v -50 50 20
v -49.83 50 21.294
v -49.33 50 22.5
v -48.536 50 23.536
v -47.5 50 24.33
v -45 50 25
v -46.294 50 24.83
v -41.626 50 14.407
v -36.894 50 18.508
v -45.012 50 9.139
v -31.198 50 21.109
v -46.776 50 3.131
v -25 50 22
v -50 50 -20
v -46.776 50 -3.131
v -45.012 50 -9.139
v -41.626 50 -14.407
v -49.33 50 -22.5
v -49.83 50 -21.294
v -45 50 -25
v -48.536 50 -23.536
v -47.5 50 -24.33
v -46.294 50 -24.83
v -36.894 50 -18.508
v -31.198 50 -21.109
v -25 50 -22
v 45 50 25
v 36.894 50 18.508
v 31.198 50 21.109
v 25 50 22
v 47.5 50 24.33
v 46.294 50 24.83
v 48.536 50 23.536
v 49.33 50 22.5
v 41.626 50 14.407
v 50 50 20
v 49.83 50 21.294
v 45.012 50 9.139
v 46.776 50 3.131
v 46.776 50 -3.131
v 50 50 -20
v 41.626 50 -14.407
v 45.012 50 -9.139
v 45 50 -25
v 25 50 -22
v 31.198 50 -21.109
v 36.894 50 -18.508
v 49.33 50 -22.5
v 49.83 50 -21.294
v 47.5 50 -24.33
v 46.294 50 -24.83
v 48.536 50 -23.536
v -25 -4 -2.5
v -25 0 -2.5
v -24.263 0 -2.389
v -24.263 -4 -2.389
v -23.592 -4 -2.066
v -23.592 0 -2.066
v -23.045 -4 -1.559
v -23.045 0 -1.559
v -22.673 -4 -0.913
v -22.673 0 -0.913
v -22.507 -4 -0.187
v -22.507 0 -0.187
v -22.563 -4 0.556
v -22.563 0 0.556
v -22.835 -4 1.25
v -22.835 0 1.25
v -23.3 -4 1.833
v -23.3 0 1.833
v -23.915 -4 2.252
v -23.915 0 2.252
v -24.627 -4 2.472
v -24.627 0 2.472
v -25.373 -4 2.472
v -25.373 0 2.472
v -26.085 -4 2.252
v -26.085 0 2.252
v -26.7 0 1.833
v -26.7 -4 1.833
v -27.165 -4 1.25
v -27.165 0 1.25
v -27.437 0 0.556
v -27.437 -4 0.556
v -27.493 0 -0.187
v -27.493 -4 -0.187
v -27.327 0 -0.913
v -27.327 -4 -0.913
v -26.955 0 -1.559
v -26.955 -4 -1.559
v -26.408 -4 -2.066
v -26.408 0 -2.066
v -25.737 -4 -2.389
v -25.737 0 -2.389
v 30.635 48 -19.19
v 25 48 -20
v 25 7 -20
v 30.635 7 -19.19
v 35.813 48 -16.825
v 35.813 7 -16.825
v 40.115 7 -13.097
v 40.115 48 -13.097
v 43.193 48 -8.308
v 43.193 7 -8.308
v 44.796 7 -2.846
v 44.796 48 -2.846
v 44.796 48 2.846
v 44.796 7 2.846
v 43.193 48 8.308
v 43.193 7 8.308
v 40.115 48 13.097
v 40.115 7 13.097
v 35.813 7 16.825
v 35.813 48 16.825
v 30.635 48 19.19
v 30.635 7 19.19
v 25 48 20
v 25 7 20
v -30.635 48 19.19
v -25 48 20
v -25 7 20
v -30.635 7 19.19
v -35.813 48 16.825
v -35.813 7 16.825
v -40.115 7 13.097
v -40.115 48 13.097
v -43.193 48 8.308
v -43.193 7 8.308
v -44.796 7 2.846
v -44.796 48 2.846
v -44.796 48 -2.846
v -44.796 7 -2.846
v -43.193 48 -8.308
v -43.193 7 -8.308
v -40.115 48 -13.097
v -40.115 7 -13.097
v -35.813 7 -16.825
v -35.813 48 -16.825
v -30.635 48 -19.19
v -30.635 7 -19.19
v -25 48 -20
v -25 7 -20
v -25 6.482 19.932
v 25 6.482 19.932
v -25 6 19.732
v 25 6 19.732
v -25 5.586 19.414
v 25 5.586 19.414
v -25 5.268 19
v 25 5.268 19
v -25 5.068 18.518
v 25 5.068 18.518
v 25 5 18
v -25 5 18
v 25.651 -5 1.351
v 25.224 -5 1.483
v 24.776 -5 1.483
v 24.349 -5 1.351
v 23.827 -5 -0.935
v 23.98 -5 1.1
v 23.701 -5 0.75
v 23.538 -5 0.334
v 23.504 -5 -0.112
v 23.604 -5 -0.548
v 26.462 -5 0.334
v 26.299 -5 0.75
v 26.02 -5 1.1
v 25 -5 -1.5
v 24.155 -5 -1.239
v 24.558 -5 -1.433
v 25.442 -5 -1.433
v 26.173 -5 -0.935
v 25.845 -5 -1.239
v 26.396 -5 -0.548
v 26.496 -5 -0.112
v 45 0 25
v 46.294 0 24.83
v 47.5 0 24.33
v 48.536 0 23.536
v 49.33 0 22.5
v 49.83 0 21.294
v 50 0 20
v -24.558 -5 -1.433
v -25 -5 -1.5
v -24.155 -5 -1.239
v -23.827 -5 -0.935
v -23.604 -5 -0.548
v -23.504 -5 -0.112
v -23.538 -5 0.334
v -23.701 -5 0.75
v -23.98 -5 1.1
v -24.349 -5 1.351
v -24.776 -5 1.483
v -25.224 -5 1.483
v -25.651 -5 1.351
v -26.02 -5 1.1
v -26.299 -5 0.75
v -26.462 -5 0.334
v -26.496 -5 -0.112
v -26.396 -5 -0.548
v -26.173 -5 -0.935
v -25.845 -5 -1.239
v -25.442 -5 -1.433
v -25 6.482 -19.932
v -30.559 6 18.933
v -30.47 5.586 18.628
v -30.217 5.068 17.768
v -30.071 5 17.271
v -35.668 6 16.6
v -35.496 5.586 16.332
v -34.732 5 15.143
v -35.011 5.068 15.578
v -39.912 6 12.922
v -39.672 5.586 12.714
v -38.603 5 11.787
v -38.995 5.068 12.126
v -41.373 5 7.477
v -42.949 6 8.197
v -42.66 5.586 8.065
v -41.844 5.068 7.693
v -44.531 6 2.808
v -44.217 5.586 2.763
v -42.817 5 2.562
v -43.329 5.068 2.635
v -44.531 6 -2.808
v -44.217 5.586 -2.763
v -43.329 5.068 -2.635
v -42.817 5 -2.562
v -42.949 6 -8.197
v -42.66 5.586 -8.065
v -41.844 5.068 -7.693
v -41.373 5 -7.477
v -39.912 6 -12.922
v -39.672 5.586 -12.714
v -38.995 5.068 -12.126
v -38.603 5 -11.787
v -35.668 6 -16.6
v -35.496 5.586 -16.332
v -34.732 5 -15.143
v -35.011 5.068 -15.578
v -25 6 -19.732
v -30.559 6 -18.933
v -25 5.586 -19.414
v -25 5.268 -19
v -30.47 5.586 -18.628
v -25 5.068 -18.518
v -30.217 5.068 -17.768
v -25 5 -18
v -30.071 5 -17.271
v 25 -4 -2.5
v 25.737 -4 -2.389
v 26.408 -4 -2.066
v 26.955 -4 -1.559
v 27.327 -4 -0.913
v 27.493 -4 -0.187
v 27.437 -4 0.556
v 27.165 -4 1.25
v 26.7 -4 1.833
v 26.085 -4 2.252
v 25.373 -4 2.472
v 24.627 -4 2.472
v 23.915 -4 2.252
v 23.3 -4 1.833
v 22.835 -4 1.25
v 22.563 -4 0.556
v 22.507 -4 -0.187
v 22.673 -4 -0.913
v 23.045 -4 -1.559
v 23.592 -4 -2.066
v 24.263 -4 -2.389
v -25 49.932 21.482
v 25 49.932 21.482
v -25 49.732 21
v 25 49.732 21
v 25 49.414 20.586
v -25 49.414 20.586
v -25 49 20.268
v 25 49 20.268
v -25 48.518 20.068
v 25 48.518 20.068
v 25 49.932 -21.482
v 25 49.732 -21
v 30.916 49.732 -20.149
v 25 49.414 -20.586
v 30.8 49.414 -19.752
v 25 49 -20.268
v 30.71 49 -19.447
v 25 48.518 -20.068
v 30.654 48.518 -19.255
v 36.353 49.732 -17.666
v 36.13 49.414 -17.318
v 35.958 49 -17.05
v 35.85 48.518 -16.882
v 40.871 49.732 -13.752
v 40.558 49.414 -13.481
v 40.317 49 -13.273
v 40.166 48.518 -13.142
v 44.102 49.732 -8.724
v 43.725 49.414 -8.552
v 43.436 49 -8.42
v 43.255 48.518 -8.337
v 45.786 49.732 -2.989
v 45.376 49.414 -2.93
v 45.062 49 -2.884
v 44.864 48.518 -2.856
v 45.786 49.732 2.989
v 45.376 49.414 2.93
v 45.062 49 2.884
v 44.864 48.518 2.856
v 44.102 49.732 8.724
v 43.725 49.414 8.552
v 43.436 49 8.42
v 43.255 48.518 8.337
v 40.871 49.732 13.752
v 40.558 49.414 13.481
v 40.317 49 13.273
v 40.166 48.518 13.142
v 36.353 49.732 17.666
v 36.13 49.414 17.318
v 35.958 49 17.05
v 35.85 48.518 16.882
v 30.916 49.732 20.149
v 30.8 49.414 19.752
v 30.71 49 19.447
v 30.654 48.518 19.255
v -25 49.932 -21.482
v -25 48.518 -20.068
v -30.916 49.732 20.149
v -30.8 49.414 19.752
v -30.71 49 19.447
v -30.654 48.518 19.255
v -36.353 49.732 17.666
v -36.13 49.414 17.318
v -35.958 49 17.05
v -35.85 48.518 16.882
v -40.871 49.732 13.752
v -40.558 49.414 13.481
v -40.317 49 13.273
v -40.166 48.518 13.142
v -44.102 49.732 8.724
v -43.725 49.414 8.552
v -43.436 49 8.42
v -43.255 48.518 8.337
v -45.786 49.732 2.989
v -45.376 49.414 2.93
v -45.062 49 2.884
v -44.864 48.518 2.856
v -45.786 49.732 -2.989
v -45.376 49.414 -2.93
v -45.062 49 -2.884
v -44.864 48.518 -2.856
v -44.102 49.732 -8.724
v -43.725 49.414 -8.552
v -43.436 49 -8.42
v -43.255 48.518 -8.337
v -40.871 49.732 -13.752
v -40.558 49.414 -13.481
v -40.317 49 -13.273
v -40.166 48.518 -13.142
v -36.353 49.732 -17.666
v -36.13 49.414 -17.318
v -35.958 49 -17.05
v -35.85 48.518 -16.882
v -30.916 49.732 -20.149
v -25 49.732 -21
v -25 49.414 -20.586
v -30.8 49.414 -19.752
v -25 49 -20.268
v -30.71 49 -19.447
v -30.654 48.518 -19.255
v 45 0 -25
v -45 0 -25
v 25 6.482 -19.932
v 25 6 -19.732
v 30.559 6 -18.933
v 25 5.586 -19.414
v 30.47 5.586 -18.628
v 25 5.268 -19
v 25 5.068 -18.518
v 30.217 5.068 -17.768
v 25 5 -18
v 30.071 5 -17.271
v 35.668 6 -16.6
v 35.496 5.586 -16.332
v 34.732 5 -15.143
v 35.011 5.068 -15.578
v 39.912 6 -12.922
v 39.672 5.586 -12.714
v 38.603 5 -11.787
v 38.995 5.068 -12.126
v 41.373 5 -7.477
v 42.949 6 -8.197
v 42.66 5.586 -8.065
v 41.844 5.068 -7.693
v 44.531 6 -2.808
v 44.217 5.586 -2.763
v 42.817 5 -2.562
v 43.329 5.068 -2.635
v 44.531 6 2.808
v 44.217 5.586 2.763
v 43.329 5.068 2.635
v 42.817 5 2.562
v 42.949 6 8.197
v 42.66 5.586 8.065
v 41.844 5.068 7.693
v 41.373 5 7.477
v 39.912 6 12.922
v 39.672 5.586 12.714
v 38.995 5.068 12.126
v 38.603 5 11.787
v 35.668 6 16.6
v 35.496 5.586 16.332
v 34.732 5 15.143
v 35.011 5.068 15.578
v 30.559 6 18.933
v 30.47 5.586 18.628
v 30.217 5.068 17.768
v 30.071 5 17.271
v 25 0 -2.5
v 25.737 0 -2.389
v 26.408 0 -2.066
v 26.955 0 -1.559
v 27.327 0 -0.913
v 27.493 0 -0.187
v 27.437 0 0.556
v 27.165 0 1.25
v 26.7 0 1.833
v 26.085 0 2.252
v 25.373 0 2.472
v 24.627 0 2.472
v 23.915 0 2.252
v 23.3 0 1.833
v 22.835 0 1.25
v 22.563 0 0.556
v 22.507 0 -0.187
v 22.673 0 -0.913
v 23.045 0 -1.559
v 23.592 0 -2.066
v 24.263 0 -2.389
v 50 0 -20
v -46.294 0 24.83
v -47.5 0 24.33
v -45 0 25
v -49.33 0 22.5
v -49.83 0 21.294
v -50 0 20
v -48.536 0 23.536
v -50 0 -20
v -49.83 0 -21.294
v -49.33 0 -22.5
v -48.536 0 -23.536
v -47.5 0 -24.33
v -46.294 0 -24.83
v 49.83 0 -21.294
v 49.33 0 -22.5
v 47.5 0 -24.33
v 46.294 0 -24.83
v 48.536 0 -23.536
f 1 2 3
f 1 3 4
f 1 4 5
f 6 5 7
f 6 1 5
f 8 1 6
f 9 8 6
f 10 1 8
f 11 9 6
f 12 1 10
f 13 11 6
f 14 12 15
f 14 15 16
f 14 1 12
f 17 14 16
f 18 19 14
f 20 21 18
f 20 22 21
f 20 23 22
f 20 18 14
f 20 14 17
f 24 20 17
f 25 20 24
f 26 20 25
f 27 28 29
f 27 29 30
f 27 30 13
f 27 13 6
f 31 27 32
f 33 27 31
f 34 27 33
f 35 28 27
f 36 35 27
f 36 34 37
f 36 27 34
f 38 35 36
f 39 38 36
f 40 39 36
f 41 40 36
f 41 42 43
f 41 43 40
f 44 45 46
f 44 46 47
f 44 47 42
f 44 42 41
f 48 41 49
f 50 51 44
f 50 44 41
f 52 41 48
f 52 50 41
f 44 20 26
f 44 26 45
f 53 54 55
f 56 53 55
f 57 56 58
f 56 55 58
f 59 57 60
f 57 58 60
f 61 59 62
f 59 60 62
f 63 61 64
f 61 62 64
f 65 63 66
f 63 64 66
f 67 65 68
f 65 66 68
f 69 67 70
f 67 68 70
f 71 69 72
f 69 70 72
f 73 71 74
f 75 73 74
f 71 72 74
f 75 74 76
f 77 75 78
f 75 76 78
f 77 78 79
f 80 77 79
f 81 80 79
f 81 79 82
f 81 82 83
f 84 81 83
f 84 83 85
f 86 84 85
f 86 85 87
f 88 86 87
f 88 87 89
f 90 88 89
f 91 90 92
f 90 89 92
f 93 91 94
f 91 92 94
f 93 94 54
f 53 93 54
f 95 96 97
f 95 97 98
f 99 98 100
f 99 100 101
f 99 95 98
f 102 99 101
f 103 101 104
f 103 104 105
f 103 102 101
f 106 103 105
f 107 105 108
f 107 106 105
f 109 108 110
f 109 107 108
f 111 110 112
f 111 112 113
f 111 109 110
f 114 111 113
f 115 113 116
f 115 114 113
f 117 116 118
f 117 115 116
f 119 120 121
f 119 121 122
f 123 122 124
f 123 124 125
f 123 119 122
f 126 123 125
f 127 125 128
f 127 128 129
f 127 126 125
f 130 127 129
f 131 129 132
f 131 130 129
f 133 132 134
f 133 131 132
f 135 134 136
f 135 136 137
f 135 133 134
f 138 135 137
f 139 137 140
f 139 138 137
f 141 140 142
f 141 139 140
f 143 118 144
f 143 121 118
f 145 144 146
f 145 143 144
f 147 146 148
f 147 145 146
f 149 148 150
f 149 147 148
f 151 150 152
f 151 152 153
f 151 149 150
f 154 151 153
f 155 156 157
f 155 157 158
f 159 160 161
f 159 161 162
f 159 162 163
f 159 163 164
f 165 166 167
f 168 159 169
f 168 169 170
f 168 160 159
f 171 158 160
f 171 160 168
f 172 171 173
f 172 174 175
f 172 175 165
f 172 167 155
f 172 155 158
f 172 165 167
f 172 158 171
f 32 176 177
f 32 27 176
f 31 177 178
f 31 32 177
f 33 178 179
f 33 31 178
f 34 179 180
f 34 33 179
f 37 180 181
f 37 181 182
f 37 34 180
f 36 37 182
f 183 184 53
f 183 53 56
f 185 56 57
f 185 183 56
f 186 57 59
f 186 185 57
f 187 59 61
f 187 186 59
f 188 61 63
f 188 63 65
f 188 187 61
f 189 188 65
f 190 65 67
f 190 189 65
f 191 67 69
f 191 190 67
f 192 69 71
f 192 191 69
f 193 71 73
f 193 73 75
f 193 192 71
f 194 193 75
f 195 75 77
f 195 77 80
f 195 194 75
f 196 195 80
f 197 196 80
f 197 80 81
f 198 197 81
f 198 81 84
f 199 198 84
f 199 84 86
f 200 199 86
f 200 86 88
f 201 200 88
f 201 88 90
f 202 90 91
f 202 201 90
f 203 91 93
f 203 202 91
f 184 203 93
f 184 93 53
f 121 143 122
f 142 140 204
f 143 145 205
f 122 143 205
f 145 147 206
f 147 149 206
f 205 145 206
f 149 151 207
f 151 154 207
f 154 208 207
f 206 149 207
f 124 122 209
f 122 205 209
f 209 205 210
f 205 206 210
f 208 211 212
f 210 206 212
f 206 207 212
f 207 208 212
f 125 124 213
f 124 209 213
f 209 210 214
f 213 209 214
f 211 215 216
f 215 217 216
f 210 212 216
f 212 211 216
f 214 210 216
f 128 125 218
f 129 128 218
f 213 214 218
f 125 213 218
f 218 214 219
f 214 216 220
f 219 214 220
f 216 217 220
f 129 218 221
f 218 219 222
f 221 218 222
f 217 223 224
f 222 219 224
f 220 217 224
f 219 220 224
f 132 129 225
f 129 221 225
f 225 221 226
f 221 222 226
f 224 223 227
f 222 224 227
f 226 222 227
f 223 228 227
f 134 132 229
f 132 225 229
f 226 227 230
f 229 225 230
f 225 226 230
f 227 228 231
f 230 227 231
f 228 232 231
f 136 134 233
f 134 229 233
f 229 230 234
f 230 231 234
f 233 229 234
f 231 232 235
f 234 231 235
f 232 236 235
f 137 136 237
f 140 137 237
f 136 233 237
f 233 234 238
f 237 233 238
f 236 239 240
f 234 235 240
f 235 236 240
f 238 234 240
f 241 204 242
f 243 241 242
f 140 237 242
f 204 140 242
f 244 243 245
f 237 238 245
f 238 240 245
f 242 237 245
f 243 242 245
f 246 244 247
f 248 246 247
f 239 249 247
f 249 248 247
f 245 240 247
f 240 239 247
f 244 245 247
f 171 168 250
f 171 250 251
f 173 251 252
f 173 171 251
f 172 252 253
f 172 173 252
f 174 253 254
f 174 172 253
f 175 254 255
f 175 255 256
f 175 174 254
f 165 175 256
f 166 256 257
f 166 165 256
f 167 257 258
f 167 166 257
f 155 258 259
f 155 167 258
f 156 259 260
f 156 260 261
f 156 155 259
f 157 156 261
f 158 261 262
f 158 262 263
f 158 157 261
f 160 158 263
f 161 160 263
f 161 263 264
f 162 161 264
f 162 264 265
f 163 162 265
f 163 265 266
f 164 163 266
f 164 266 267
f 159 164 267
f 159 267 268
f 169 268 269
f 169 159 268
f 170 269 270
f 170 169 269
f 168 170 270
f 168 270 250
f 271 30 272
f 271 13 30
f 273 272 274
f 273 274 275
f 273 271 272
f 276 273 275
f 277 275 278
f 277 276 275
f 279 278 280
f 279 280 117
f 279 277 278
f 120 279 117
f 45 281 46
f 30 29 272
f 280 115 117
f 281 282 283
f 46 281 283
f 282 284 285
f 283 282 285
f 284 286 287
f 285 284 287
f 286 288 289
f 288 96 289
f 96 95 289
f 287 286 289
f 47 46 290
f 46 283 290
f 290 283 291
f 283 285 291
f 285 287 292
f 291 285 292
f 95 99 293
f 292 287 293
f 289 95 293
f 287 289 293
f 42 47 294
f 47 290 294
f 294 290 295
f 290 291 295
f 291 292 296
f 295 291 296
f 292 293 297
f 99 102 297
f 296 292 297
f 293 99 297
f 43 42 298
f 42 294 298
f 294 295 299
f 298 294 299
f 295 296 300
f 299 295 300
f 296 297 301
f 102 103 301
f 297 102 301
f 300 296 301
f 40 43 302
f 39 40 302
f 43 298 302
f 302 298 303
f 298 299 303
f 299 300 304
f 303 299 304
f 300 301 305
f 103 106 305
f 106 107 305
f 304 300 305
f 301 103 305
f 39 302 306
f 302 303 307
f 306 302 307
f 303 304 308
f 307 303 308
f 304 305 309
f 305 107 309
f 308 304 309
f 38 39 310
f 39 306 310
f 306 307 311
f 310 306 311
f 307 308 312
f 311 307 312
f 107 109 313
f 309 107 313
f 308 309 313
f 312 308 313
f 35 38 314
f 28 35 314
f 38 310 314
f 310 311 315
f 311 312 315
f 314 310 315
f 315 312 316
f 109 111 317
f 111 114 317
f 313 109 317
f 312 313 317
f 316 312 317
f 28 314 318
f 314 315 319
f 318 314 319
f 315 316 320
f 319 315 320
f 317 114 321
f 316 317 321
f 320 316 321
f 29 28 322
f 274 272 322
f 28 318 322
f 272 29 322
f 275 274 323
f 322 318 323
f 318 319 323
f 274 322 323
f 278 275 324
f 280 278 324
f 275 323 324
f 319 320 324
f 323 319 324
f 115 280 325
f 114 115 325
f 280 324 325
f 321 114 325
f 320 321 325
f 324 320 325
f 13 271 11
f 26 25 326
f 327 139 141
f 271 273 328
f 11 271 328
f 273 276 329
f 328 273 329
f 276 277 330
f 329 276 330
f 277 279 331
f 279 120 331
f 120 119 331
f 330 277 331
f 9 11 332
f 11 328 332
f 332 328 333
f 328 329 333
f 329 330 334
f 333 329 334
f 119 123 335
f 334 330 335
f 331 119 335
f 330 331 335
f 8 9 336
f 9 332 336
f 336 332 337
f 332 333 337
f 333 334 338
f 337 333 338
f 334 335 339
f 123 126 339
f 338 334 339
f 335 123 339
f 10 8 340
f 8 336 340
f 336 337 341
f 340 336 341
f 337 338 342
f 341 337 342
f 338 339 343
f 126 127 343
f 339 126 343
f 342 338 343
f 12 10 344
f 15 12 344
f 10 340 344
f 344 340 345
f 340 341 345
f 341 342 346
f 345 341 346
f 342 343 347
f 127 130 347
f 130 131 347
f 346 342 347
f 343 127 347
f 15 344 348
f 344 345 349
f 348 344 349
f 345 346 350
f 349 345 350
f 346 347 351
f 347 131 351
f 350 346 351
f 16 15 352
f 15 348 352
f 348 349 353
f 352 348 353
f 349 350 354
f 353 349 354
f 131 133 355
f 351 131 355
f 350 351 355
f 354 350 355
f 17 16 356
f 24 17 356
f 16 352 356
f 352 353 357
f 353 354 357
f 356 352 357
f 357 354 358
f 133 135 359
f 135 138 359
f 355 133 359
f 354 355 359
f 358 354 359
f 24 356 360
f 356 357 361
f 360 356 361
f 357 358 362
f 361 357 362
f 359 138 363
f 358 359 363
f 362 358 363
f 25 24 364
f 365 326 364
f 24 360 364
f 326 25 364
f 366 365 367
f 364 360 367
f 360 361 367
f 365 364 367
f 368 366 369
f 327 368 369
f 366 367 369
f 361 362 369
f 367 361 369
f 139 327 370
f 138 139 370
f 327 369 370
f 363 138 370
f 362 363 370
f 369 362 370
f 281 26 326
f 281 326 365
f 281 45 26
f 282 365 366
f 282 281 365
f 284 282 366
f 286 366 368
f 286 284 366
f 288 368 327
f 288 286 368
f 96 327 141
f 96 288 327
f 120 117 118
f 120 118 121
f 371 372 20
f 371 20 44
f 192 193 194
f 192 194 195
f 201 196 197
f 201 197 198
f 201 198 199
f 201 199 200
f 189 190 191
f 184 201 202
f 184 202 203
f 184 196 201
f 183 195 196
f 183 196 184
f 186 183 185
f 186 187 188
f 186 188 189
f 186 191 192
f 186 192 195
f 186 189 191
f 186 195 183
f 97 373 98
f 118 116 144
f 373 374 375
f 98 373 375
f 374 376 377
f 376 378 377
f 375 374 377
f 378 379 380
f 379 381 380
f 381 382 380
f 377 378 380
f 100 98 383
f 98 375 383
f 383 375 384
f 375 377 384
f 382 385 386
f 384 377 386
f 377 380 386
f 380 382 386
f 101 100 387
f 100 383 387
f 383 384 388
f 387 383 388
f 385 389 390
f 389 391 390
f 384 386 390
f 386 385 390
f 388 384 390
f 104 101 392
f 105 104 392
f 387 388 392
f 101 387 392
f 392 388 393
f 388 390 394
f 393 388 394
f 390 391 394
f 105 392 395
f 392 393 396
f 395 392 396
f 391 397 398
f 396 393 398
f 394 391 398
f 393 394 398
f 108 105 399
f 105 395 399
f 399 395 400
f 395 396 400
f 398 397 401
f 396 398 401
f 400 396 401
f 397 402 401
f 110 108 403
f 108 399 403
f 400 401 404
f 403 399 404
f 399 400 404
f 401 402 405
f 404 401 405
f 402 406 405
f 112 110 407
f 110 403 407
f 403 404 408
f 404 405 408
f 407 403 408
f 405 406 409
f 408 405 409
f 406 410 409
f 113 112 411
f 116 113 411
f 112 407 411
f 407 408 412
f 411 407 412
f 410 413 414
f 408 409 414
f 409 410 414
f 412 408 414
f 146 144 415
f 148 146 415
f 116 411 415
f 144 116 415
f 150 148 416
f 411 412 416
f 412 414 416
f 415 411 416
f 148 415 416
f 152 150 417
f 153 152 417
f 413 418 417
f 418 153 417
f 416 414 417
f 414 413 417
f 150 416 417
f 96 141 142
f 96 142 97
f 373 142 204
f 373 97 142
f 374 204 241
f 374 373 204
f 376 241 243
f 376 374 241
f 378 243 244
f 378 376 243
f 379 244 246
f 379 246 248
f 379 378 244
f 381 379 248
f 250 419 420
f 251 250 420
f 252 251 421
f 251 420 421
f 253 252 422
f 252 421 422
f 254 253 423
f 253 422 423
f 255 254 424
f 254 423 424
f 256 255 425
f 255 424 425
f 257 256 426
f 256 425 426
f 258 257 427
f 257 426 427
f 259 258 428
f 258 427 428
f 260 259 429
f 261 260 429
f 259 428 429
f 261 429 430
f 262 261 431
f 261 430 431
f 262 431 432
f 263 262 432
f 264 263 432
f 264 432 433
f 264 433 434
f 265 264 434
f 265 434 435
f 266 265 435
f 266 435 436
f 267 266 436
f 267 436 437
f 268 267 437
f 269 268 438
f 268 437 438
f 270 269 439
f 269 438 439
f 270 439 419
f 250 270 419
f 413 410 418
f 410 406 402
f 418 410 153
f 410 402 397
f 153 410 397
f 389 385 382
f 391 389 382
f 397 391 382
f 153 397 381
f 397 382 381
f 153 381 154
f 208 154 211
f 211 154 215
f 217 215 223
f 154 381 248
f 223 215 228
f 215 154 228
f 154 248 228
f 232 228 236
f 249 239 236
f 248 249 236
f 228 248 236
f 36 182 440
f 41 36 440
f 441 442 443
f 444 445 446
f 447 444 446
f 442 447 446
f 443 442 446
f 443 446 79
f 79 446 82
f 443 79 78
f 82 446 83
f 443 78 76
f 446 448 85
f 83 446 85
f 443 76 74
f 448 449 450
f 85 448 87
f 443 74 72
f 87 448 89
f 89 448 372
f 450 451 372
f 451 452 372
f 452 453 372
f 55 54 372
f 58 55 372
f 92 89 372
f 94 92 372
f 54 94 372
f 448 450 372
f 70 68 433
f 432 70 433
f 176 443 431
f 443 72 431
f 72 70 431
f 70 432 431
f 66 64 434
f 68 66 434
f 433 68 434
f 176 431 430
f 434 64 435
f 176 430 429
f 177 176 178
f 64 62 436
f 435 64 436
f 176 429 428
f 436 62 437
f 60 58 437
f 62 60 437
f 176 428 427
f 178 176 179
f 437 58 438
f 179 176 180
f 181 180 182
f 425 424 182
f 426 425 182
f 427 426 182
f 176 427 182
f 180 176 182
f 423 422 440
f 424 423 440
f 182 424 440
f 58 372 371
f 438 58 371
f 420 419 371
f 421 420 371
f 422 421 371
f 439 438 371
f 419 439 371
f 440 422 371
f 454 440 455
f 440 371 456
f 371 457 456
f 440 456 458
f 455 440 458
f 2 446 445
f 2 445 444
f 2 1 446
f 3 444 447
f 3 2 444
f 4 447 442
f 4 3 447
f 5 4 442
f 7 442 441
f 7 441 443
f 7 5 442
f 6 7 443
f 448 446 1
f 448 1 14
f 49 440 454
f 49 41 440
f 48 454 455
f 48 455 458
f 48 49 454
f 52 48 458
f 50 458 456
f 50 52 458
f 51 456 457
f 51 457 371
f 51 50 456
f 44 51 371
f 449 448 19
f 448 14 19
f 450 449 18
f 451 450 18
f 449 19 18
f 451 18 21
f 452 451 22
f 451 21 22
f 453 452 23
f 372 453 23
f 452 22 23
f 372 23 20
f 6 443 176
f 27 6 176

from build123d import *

# Parameters (mm, degrees)
SKETCH1_W           = 100
SKETCH1_H           = 50
BOSS_EXTRUDE1_DEPTH = 50
FILLET1_R           = 5
SKETCH2_R           = 2.5
BOSS_EXTRUDE2_DEPTH = 5
CHAMFER1_SIZE       = 1
CUT_EXTRUDE1_DEPTH  = 45
FILLET2_R           = 2


with BuildPart() as part:
    # Sketch1 → Boss-Extrude1 (new body)
    with BuildSketch(Plane(origin=(0, 0, 0), x_dir=(1, 0, 0), z_dir=(0, 1, 0))):
        Rectangle(SKETCH1_W, SKETCH1_H)
    extrude(amount=BOSS_EXTRUDE1_DEPTH)

    # Fillet1
    fillet1_edges = [part.edges().sort_by_distance(p)[0] for p in [
        (50, 25, 25),
        (-50, 25, 25),
        (-50, 25, -25),
        (50, 25, -25),
    ]]
    fillet(fillet1_edges, radius=FILLET1_R)

    # Sketch2 → Boss-Extrude2 (add)
    with BuildSketch(Plane.XZ):
        with Locations(Location((-25, 0, 0), (0, 0, 270))):
            Circle(SKETCH2_R)
        with Locations(Location((25, 0, 0), (0, 0, 270))):
            Circle(SKETCH2_R)
    extrude(amount=BOSS_EXTRUDE2_DEPTH)

    # Chamfer1
    chamfer1_edges = [part.edges().sort_by_distance(p)[0] for p in [
        (-25, -5, 2.5),
        (25, -5, 2.5),
    ]]
    chamfer(chamfer1_edges, length=CHAMFER1_SIZE)

    # Sketch3 → Cut-Extrude1 (cut)
    with BuildSketch(Plane(origin=(0, 50, 0), x_dir=(1, 0, 0), z_dir=(0, 1, 0))):
        with BuildLine():
            Line((-25, 20), (25, 20))
            ThreePointArc((25, 20), (45, 0), (25, -20))
            Line((25, -20), (-25, -20))
            ThreePointArc((-25, -20), (-45, 0), (-25, 20))
        make_face()
    extrude(amount=-CUT_EXTRUDE1_DEPTH, mode=Mode.SUBTRACT)

    # Fillet2
    fillet2_edges = [part.edges().sort_by_distance(p)[0] for p in [
        (-45, 50, 0),
        (0, 50, 20),
        (45, 50, 0),
        (0, 50, -20),
        (0, 5, 20),
        (45, 5, 0),
        (0, 5, -20),
        (-45, 5, 0),
    ]]
    fillet(fillet2_edges, radius=FILLET2_R)


solid = part.part
